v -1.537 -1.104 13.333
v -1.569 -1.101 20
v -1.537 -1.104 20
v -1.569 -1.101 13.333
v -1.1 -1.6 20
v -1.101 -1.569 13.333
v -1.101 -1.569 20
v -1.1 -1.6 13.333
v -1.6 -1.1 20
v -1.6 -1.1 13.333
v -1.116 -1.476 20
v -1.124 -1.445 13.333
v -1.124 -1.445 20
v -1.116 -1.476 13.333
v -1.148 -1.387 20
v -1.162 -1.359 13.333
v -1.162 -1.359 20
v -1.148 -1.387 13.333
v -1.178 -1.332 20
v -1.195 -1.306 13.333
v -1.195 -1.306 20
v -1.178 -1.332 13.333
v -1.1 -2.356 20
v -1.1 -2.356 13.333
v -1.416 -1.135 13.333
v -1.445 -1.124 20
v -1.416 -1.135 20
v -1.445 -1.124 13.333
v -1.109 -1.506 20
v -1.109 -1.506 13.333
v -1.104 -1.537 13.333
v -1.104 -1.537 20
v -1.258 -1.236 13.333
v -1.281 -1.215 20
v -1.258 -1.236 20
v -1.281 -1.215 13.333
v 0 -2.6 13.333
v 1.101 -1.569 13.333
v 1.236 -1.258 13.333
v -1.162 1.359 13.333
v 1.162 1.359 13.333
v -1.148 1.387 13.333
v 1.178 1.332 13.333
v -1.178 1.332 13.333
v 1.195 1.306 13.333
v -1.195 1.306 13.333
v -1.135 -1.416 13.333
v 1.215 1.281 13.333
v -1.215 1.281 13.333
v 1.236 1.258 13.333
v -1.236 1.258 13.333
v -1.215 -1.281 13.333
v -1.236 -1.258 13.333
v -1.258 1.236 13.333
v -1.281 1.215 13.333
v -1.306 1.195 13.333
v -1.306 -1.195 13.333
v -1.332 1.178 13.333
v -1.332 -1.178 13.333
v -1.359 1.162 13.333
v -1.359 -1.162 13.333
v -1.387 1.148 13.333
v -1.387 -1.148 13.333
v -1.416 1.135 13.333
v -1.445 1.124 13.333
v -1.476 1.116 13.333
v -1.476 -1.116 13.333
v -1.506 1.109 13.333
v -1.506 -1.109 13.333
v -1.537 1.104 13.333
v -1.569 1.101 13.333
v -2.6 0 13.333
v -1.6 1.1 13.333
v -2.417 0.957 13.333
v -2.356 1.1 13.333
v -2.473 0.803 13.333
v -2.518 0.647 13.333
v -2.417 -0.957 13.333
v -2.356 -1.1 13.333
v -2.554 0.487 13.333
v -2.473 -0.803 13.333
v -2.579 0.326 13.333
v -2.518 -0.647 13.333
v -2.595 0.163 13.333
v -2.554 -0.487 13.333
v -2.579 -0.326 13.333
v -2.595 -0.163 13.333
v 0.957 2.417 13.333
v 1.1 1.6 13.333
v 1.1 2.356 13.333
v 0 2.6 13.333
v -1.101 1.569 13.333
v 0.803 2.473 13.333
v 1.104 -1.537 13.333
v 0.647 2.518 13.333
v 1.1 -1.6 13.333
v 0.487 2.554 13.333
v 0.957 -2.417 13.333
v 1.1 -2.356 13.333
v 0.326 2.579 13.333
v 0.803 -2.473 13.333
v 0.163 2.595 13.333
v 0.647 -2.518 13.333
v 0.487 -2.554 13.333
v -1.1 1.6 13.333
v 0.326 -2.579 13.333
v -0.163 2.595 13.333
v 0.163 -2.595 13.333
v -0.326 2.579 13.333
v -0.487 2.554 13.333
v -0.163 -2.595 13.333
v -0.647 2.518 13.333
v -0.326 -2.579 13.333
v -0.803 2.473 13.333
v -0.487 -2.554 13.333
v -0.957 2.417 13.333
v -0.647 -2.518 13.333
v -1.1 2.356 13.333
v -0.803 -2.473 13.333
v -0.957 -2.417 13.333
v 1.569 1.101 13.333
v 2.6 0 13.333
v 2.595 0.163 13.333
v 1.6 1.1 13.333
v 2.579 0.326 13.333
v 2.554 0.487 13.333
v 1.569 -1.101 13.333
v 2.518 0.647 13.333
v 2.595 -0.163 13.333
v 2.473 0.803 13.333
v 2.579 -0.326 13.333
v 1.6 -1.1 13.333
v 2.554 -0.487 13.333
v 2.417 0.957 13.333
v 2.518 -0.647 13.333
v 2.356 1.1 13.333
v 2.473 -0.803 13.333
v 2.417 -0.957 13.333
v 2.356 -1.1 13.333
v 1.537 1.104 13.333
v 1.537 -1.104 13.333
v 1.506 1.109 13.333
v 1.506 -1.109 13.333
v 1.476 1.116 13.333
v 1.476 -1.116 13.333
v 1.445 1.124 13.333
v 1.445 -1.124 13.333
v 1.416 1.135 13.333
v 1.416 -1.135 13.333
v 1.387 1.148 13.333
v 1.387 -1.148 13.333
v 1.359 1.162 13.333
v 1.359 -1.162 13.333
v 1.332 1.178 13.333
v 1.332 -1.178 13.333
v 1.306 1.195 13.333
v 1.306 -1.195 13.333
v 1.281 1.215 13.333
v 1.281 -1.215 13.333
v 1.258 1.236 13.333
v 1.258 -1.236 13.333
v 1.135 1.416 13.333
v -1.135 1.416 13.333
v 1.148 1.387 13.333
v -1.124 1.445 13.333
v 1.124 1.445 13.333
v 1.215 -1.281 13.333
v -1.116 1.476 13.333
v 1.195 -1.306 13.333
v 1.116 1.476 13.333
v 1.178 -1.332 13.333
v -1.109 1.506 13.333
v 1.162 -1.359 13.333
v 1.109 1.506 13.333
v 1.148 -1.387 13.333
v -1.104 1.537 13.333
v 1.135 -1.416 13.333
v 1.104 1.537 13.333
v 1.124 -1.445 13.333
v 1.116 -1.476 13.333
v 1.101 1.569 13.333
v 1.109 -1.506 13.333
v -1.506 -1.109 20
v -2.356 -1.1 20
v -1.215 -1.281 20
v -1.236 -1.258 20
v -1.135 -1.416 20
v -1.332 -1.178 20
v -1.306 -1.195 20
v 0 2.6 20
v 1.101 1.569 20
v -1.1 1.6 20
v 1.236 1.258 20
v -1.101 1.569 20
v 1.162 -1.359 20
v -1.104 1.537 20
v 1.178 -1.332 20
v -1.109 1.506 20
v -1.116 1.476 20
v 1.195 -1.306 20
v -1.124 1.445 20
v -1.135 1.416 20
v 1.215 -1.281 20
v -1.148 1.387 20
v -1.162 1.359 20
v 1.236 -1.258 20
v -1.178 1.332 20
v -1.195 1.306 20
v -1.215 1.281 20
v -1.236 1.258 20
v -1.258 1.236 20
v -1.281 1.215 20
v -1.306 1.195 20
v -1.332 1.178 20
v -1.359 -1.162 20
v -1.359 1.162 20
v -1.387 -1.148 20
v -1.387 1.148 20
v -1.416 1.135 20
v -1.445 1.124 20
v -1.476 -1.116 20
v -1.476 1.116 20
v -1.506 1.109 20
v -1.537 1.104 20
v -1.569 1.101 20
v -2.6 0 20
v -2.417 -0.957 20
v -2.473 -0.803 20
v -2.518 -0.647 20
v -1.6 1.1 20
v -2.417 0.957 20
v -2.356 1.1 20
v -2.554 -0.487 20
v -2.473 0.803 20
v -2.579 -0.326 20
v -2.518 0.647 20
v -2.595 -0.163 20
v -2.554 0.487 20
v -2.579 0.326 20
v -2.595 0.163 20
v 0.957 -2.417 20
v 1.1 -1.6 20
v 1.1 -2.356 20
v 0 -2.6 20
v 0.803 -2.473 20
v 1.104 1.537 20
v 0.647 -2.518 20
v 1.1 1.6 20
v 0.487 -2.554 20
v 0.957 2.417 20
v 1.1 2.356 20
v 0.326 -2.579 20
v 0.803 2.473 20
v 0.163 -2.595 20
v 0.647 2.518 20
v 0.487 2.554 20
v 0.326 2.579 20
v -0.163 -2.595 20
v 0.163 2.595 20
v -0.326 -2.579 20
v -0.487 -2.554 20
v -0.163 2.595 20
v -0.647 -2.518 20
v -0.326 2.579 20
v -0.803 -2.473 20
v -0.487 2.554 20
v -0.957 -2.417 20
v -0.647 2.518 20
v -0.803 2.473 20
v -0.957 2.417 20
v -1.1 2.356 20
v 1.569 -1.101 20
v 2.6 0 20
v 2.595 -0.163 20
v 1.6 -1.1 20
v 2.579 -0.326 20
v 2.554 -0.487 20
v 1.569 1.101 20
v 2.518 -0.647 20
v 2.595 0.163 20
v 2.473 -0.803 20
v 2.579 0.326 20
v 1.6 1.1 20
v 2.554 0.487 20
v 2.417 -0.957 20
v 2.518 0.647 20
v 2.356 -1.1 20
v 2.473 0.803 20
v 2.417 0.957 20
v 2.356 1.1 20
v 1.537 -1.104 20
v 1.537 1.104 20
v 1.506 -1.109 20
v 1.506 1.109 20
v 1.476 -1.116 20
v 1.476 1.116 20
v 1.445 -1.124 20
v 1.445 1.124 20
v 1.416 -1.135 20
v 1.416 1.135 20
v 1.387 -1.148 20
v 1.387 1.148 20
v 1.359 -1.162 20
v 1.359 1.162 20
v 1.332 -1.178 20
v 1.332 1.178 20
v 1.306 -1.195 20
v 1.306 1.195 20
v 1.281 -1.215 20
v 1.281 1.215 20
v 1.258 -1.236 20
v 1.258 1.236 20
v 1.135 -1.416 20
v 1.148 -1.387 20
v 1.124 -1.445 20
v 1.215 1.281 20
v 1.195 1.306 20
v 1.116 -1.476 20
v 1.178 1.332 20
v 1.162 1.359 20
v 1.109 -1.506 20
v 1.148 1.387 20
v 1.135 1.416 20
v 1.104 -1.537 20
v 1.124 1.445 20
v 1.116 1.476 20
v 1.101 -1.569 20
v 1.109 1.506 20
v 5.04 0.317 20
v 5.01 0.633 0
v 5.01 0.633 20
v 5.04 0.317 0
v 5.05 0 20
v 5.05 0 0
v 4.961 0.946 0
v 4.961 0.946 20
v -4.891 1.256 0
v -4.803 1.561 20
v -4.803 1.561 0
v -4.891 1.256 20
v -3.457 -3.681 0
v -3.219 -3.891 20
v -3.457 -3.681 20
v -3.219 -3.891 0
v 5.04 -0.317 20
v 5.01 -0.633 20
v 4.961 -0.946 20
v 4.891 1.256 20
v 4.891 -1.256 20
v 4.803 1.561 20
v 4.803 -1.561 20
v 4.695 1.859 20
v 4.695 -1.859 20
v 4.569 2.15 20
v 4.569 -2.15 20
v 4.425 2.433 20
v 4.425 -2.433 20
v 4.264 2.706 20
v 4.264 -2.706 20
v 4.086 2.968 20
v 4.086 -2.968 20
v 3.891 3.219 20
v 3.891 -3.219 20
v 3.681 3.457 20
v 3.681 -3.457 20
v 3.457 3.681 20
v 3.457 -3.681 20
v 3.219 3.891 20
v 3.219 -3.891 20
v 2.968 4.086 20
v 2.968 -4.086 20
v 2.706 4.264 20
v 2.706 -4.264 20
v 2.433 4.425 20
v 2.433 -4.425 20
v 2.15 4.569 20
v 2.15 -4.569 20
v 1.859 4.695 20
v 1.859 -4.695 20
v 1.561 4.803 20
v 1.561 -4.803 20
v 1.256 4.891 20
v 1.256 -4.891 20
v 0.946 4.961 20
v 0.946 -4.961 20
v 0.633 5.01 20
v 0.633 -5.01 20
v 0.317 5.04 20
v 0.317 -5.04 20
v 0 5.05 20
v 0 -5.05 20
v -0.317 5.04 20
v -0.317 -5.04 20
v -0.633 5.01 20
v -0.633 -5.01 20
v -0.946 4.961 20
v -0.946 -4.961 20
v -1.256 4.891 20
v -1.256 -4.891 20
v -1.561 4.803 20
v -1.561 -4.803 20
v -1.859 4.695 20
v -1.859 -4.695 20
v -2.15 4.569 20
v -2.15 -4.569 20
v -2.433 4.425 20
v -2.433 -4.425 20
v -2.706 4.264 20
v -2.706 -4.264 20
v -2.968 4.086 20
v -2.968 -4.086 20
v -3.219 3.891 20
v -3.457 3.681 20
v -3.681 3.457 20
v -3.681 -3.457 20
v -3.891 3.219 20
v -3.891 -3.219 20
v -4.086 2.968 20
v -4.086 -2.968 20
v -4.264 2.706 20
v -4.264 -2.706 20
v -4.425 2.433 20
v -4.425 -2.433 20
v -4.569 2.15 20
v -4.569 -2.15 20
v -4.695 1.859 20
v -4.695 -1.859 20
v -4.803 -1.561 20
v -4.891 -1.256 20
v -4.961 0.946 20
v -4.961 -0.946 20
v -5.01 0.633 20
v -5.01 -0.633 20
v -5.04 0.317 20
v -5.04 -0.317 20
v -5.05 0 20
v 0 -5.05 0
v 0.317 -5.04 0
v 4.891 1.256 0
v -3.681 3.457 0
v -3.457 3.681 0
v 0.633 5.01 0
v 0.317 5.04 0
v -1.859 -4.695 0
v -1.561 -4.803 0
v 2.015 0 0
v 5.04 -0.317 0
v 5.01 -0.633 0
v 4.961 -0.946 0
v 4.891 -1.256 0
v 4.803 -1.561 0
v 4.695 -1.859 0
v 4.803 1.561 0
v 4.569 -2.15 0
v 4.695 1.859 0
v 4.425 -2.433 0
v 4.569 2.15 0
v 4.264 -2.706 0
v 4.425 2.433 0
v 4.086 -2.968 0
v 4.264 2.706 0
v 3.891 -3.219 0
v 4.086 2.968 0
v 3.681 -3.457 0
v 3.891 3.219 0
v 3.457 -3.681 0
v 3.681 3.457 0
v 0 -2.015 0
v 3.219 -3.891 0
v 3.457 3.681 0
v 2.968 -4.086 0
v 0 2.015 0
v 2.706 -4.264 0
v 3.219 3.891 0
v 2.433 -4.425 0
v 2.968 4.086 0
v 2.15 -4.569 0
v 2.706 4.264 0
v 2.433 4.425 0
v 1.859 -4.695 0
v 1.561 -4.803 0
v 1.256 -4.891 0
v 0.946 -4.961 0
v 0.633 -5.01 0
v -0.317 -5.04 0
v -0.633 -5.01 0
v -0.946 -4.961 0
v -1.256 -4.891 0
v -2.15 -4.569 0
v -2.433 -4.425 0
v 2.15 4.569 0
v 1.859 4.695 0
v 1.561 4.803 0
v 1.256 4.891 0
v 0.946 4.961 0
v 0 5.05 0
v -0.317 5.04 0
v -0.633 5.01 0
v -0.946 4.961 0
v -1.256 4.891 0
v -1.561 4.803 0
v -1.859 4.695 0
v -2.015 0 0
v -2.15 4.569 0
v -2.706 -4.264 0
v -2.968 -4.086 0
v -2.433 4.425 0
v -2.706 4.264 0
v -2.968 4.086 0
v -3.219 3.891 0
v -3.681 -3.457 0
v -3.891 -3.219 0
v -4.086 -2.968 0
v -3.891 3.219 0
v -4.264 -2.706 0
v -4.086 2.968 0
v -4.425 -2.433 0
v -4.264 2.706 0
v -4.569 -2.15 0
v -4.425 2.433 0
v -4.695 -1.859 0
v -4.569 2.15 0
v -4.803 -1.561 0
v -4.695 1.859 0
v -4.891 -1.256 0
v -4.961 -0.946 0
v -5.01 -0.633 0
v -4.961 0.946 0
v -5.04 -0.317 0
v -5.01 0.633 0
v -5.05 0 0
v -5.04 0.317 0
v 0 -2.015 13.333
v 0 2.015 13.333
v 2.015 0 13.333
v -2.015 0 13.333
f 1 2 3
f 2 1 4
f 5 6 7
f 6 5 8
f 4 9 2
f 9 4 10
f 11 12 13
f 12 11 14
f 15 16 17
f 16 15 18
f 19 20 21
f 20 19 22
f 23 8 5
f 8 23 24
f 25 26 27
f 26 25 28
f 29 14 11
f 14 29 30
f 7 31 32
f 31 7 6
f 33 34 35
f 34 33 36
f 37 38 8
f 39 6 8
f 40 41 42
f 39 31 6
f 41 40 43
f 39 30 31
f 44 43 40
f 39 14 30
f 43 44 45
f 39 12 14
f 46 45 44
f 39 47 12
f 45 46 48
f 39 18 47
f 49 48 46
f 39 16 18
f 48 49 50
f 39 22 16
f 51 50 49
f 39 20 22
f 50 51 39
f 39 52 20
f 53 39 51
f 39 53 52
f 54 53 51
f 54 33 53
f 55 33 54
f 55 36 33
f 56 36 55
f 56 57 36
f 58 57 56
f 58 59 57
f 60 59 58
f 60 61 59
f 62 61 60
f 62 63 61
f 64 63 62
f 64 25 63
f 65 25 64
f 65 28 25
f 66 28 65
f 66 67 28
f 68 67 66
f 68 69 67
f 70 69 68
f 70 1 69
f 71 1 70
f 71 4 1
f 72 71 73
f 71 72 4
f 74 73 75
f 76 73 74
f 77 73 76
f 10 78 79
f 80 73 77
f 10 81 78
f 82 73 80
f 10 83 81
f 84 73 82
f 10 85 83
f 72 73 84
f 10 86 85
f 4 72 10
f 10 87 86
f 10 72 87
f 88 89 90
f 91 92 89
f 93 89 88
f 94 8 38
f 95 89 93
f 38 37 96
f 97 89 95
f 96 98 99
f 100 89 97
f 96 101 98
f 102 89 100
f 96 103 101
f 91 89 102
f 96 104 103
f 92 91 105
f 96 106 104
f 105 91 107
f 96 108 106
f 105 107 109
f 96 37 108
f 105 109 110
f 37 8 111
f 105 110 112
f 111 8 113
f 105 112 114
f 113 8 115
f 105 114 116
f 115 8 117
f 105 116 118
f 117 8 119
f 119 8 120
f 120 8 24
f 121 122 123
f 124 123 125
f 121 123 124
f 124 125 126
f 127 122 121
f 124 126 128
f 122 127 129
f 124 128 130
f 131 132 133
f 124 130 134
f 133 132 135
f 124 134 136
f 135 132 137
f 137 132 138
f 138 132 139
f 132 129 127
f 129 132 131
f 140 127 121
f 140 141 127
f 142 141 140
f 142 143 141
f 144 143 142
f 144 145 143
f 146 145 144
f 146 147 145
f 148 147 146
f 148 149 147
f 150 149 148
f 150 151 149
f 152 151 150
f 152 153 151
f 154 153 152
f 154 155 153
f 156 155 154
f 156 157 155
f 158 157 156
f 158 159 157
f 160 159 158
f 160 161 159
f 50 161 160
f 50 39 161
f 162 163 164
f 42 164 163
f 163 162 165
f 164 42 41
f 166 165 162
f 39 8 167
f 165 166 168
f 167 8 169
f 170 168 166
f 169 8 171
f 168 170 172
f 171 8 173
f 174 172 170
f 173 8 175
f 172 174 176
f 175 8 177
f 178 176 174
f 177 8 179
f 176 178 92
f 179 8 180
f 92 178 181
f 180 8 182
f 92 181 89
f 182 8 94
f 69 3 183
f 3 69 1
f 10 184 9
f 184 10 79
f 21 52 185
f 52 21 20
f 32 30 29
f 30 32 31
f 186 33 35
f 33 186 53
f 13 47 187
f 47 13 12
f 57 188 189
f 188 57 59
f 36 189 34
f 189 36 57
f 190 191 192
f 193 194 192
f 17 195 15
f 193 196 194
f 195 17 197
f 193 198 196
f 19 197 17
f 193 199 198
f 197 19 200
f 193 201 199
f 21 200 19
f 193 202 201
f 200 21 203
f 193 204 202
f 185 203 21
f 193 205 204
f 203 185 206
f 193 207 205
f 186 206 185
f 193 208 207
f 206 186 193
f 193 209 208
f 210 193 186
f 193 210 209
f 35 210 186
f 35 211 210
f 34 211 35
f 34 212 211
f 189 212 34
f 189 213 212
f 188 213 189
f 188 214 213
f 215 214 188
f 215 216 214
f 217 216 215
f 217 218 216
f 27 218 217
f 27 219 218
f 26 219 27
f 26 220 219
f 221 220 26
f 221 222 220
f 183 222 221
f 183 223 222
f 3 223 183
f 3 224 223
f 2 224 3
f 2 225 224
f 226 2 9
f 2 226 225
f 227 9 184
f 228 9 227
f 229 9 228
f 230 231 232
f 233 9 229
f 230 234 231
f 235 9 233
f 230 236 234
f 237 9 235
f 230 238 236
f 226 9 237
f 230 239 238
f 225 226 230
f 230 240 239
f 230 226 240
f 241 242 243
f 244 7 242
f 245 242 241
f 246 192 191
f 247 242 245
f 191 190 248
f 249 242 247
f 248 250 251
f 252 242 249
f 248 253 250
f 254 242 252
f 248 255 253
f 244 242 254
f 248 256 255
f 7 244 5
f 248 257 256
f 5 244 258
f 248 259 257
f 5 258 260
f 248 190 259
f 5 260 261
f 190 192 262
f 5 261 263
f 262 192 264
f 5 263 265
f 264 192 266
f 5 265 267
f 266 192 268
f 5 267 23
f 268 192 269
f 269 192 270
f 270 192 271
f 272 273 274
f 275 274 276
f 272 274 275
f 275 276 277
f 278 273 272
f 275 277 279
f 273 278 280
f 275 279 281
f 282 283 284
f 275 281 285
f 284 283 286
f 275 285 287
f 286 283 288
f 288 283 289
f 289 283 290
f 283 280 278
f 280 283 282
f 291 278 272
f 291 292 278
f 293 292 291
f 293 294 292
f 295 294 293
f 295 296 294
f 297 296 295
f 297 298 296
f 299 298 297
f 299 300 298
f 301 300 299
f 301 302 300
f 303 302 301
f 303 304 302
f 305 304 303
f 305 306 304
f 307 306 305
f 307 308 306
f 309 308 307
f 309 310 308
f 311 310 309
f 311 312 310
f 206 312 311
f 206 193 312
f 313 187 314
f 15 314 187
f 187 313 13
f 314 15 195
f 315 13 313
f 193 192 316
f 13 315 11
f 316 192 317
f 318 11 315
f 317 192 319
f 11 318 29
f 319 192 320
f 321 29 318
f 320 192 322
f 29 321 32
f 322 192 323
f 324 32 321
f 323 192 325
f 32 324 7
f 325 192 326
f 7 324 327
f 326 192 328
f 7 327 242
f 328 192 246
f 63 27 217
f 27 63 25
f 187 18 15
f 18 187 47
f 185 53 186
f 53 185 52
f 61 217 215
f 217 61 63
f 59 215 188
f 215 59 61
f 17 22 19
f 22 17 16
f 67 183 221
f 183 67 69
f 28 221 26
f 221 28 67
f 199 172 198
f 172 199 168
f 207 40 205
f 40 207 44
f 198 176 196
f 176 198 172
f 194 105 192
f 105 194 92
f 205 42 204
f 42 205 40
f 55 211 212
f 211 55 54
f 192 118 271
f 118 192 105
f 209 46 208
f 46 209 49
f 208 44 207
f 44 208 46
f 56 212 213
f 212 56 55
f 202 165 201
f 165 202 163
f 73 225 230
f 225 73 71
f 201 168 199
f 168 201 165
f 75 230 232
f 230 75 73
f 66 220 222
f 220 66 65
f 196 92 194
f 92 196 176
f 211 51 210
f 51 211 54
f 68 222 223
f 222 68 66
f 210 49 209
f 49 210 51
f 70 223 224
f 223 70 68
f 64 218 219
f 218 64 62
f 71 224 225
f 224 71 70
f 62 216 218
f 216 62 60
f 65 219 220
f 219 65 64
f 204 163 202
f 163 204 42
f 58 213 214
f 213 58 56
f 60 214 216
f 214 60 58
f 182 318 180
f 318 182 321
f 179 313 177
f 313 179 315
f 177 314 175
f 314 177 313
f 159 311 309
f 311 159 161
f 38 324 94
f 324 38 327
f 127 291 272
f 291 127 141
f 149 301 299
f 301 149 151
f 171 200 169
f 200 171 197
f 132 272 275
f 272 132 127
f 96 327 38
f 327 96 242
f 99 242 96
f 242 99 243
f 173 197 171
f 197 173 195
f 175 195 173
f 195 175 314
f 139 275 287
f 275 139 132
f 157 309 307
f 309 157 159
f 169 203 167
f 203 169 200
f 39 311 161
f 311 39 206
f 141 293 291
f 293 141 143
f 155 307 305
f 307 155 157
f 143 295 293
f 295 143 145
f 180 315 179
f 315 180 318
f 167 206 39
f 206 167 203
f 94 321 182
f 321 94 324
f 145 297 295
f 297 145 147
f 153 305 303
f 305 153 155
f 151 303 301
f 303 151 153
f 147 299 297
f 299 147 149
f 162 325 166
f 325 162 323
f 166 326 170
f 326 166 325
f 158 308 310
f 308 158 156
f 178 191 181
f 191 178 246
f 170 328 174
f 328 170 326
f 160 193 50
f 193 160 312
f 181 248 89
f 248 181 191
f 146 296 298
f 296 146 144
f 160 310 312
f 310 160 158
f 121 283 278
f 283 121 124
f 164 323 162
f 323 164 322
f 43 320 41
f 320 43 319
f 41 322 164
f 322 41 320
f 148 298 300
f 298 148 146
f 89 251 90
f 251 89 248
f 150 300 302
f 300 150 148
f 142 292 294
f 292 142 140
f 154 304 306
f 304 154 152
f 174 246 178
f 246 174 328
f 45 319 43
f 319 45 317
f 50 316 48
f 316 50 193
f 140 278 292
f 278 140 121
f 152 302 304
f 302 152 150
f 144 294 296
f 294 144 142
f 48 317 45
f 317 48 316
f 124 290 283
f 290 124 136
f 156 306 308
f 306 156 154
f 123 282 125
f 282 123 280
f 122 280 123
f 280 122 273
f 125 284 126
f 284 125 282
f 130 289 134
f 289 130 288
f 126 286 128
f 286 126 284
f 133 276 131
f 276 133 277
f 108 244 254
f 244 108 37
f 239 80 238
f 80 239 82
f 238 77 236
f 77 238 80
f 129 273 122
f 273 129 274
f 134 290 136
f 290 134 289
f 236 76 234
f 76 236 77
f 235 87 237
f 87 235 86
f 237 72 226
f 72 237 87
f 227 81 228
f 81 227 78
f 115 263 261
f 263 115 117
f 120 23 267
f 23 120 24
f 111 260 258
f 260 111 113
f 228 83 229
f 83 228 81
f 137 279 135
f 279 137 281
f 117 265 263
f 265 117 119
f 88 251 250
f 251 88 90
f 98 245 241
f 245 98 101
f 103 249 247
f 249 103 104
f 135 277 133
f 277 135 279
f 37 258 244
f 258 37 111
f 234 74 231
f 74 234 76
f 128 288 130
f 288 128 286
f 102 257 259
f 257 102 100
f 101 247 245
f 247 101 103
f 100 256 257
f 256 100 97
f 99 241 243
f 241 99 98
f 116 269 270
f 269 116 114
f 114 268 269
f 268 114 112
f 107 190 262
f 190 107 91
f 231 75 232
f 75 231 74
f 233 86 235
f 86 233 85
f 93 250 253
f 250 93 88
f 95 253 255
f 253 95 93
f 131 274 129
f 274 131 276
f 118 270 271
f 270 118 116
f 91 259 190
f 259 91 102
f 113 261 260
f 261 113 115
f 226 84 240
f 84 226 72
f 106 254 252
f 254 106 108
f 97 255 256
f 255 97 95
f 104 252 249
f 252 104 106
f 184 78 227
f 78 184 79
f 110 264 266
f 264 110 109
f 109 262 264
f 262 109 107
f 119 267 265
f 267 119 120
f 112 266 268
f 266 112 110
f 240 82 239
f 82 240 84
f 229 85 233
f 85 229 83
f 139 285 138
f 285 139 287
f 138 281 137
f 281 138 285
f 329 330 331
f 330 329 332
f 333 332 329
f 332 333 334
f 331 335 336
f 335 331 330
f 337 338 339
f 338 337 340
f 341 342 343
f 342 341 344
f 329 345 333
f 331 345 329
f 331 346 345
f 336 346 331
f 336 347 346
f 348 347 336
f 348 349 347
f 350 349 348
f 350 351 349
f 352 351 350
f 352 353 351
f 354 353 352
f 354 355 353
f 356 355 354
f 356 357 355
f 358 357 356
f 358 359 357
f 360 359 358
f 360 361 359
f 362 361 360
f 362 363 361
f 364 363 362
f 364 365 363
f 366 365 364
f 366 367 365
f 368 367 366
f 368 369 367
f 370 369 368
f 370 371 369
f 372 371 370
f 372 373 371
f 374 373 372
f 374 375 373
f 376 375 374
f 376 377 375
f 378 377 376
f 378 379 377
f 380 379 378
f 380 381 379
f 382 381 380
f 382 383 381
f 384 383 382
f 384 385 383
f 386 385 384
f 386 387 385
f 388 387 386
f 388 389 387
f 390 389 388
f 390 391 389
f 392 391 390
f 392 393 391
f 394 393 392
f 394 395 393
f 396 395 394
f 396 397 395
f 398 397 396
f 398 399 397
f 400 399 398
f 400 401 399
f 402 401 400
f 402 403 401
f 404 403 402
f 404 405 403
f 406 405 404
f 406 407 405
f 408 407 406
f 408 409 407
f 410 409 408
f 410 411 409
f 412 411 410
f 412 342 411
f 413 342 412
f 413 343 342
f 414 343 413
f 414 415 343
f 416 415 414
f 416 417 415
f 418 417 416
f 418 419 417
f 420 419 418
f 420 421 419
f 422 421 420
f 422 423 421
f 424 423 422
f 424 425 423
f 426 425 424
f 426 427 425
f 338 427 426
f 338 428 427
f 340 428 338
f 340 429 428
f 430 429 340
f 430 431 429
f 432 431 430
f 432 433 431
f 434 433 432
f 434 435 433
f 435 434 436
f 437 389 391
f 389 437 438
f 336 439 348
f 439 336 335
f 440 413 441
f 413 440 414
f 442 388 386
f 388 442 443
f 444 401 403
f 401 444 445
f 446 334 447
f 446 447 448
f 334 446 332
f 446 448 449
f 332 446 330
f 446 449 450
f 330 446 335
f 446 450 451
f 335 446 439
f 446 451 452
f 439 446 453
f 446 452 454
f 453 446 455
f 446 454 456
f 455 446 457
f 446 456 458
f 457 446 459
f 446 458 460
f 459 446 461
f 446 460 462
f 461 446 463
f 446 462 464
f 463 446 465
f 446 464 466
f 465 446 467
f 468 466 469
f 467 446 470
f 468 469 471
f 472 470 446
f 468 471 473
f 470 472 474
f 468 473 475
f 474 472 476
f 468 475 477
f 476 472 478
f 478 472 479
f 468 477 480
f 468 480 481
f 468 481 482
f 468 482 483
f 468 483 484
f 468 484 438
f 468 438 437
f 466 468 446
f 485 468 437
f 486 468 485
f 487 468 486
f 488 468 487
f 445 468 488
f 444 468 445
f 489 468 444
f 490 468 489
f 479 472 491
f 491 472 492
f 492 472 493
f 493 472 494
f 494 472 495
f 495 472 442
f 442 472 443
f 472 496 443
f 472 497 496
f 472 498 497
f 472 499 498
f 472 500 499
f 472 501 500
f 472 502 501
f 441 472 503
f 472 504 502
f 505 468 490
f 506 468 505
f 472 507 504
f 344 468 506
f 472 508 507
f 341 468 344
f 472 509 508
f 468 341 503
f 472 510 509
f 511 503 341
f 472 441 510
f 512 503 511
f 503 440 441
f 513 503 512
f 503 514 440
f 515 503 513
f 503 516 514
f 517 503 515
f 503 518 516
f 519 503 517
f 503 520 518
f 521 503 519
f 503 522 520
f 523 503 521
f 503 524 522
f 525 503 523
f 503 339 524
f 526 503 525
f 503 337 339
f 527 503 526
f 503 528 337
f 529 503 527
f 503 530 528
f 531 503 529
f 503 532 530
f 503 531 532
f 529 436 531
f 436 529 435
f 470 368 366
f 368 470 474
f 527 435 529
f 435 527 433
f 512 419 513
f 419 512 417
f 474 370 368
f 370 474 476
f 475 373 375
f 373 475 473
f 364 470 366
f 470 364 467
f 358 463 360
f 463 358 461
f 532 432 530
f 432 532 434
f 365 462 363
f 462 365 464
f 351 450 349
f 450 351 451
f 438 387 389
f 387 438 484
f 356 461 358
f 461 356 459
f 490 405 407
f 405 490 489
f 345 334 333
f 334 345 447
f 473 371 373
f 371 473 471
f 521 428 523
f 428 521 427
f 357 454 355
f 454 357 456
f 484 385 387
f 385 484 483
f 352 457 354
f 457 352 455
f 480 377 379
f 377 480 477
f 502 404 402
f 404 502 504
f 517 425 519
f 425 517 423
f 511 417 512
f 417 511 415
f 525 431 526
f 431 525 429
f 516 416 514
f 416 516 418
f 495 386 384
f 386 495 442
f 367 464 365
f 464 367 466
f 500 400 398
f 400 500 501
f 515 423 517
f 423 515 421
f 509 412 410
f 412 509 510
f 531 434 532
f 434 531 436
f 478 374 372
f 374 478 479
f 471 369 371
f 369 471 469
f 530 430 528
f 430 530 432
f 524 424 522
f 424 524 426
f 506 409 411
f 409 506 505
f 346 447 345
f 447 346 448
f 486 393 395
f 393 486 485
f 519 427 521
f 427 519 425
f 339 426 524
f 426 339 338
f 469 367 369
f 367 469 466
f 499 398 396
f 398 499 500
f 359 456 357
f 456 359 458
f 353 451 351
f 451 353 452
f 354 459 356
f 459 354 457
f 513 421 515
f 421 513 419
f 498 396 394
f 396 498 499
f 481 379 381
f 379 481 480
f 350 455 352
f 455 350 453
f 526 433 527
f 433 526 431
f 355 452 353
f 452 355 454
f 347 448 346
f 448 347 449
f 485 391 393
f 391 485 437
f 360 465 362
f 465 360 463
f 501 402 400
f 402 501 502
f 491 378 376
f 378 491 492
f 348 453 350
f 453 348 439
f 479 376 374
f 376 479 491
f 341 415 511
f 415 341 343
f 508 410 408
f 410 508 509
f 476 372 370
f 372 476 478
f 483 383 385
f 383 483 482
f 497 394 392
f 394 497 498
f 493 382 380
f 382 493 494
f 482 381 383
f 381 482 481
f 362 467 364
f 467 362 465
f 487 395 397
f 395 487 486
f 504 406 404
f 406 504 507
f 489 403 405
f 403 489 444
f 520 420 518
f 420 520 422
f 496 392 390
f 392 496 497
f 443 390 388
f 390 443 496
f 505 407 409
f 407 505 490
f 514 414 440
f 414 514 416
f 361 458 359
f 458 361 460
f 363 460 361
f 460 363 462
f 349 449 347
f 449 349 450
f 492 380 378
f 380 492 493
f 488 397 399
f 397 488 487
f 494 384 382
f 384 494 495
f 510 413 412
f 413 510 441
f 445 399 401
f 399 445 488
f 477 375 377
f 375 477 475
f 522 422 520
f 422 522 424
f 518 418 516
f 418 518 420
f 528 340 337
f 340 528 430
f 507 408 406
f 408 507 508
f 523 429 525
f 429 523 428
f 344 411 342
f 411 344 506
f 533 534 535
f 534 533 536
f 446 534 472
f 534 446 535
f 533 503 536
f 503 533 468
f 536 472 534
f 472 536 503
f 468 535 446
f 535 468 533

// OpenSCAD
// file: beam.scad
LENGTH_UNITS = 3;
WIDTH_UNITS = 1;
THICKNESS_UNITS = 0.5;
HOLE_TYPES = [ // 1 - axle, 0 - peg
    1, 0, 1
];

// Internal parameters
XY_UNIT = 8;
Z_UNIT = 7.9;
BEAM_DIA = 7.5;
HOLE_INNER_DIA = 4.8;
HOLE_OUTER_DIA = 6.2;
HOLE_OUTER_DEPTH = 0.8;
HOLE_AXLE_WIDTH = 1.85;

TEST_DELTA = false; // Set to true to generate lengthwise 0.1-increments on the hole dia.
HOLE_AXLE_DELTA = 0.3; // Set to whatever your printer prints best out of the tested increments.
HOLE_PEG_DELTA = 0.25;

FOOT_EXTRA_DELTA = 0.1; // To battle the elephant foot.

$fn = 100;

module rounded_cube(length, width, thickness, corner_dia = 1) {
    hull() {
        for(i = [-1, 1]) {
            for(j = [-1, 1]) {
                translate([i * (length - corner_dia)/2, j * (width - corner_dia)/2, 0])
                cylinder(d = corner_dia, h = thickness);
            }
        }
    }
}

module peg_hole(inner_dia, outer_dia, depth, thickness) {
    d = TEST_DELTA ? 0 : HOLE_PEG_DELTA;
    union() {
        translate([0, 0, thickness - depth])
        cylinder(d = outer_dia + d, h = depth);
        cylinder(d = inner_dia + d, h = thickness);
        translate([0, 0, depth])
        cylinder(d1 = outer_dia + d, d2 = inner_dia + d, h = depth*2/3);
        cylinder(d = outer_dia + d + FOOT_EXTRA_DELTA, h = depth);
    }
}

module axle_hole(inner_dia, axle_width, thickness) {
    d = TEST_DELTA ? 0 : HOLE_AXLE_DELTA;
    w = (inner_dia - axle_width);
    difference() {
        cylinder(d = inner_dia + d, h = thickness);
        for(i = [-1, 1]) {
            for(j = [-1, 1]) {
                translate([i * (inner_dia + d)/2, j * (inner_dia + d)/2, 0])
                rounded_cube(w, w, thickness);
            }
        }
    }
}

module lego_translate(x, y, z) {
    translate([x * XY_UNIT, y * XY_UNIT, z * Z_UNIT])
    children();
}

module plate_body(length, width, thickness, dia) {
    hull() {
        for(i = [-1, 1]) {
            for(j = [-1, 1]) {
                lego_translate(i * (length - 1)/2, j * (width - 1)/2, 0)
                cylinder(d = dia, h = thickness * Z_UNIT);
            }
        }
    }
}

module plate_holes(length, width, thickness, hole_types, beam_dia) {
    lego_translate(-(length - 1)/2, -(width - 1)/2, 0)
    union() {
        for(i = [0:length]) {
            for(j = [0:width]) {
                d = TEST_DELTA ? i * 0.1 : 0;
                lego_translate(i, j, 0)
                if(hole_types != undef && hole_types[j * length + i]) {
                    axle_hole(HOLE_INNER_DIA + d, HOLE_AXLE_WIDTH + d, thickness * Z_UNIT);
                } else {
                    peg_hole(HOLE_INNER_DIA + d, HOLE_OUTER_DIA + d, HOLE_OUTER_DEPTH, thickness * Z_UNIT);
                }
            }
        }
    }
}

module plate(length, width, thickness, hole_types, beam_dia) {
    difference() {
        plate_body(length, width, thickness, beam_dia);
        plate_holes(length, width, thickness, hole_types);
    }
}

module beam(length, thickness, hole_types = [], beam_dia = BEAM_DIA) {
    plate(length, 1, thickness, hole_types, beam_dia);
}

beam(LENGTH_UNITS, THICKNESS_UNITS, HOLE_TYPES);
// main file
DELTA = 0.1;

HEIGHT = 20;
DIA = 10 + DELTA;
SHAFT_WIDTH = 2.75 + DELTA;

AXLE_DIA = 4.8 + DELTA;
AXLE_WIDTH = 1.85 + DELTA/2;

use <beam.scad>;

$fn = 100;

module adapter(dia, ah, sh) {
  difference() {
    cylinder(d = dia, h = ah + sh);
    rotate([0, 0, 45])
    translate([-SHAFT_WIDTH/2, -SHAFT_WIDTH/2, 0])
    cube(size = [SHAFT_WIDTH, SHAFT_WIDTH, sh]);
    translate([0, 0, sh])
    axle_hole(AXLE_DIA, AXLE_WIDTH, ah);
  }
}

adapter(DIA, HEIGHT/3, 2*HEIGHT/3);
